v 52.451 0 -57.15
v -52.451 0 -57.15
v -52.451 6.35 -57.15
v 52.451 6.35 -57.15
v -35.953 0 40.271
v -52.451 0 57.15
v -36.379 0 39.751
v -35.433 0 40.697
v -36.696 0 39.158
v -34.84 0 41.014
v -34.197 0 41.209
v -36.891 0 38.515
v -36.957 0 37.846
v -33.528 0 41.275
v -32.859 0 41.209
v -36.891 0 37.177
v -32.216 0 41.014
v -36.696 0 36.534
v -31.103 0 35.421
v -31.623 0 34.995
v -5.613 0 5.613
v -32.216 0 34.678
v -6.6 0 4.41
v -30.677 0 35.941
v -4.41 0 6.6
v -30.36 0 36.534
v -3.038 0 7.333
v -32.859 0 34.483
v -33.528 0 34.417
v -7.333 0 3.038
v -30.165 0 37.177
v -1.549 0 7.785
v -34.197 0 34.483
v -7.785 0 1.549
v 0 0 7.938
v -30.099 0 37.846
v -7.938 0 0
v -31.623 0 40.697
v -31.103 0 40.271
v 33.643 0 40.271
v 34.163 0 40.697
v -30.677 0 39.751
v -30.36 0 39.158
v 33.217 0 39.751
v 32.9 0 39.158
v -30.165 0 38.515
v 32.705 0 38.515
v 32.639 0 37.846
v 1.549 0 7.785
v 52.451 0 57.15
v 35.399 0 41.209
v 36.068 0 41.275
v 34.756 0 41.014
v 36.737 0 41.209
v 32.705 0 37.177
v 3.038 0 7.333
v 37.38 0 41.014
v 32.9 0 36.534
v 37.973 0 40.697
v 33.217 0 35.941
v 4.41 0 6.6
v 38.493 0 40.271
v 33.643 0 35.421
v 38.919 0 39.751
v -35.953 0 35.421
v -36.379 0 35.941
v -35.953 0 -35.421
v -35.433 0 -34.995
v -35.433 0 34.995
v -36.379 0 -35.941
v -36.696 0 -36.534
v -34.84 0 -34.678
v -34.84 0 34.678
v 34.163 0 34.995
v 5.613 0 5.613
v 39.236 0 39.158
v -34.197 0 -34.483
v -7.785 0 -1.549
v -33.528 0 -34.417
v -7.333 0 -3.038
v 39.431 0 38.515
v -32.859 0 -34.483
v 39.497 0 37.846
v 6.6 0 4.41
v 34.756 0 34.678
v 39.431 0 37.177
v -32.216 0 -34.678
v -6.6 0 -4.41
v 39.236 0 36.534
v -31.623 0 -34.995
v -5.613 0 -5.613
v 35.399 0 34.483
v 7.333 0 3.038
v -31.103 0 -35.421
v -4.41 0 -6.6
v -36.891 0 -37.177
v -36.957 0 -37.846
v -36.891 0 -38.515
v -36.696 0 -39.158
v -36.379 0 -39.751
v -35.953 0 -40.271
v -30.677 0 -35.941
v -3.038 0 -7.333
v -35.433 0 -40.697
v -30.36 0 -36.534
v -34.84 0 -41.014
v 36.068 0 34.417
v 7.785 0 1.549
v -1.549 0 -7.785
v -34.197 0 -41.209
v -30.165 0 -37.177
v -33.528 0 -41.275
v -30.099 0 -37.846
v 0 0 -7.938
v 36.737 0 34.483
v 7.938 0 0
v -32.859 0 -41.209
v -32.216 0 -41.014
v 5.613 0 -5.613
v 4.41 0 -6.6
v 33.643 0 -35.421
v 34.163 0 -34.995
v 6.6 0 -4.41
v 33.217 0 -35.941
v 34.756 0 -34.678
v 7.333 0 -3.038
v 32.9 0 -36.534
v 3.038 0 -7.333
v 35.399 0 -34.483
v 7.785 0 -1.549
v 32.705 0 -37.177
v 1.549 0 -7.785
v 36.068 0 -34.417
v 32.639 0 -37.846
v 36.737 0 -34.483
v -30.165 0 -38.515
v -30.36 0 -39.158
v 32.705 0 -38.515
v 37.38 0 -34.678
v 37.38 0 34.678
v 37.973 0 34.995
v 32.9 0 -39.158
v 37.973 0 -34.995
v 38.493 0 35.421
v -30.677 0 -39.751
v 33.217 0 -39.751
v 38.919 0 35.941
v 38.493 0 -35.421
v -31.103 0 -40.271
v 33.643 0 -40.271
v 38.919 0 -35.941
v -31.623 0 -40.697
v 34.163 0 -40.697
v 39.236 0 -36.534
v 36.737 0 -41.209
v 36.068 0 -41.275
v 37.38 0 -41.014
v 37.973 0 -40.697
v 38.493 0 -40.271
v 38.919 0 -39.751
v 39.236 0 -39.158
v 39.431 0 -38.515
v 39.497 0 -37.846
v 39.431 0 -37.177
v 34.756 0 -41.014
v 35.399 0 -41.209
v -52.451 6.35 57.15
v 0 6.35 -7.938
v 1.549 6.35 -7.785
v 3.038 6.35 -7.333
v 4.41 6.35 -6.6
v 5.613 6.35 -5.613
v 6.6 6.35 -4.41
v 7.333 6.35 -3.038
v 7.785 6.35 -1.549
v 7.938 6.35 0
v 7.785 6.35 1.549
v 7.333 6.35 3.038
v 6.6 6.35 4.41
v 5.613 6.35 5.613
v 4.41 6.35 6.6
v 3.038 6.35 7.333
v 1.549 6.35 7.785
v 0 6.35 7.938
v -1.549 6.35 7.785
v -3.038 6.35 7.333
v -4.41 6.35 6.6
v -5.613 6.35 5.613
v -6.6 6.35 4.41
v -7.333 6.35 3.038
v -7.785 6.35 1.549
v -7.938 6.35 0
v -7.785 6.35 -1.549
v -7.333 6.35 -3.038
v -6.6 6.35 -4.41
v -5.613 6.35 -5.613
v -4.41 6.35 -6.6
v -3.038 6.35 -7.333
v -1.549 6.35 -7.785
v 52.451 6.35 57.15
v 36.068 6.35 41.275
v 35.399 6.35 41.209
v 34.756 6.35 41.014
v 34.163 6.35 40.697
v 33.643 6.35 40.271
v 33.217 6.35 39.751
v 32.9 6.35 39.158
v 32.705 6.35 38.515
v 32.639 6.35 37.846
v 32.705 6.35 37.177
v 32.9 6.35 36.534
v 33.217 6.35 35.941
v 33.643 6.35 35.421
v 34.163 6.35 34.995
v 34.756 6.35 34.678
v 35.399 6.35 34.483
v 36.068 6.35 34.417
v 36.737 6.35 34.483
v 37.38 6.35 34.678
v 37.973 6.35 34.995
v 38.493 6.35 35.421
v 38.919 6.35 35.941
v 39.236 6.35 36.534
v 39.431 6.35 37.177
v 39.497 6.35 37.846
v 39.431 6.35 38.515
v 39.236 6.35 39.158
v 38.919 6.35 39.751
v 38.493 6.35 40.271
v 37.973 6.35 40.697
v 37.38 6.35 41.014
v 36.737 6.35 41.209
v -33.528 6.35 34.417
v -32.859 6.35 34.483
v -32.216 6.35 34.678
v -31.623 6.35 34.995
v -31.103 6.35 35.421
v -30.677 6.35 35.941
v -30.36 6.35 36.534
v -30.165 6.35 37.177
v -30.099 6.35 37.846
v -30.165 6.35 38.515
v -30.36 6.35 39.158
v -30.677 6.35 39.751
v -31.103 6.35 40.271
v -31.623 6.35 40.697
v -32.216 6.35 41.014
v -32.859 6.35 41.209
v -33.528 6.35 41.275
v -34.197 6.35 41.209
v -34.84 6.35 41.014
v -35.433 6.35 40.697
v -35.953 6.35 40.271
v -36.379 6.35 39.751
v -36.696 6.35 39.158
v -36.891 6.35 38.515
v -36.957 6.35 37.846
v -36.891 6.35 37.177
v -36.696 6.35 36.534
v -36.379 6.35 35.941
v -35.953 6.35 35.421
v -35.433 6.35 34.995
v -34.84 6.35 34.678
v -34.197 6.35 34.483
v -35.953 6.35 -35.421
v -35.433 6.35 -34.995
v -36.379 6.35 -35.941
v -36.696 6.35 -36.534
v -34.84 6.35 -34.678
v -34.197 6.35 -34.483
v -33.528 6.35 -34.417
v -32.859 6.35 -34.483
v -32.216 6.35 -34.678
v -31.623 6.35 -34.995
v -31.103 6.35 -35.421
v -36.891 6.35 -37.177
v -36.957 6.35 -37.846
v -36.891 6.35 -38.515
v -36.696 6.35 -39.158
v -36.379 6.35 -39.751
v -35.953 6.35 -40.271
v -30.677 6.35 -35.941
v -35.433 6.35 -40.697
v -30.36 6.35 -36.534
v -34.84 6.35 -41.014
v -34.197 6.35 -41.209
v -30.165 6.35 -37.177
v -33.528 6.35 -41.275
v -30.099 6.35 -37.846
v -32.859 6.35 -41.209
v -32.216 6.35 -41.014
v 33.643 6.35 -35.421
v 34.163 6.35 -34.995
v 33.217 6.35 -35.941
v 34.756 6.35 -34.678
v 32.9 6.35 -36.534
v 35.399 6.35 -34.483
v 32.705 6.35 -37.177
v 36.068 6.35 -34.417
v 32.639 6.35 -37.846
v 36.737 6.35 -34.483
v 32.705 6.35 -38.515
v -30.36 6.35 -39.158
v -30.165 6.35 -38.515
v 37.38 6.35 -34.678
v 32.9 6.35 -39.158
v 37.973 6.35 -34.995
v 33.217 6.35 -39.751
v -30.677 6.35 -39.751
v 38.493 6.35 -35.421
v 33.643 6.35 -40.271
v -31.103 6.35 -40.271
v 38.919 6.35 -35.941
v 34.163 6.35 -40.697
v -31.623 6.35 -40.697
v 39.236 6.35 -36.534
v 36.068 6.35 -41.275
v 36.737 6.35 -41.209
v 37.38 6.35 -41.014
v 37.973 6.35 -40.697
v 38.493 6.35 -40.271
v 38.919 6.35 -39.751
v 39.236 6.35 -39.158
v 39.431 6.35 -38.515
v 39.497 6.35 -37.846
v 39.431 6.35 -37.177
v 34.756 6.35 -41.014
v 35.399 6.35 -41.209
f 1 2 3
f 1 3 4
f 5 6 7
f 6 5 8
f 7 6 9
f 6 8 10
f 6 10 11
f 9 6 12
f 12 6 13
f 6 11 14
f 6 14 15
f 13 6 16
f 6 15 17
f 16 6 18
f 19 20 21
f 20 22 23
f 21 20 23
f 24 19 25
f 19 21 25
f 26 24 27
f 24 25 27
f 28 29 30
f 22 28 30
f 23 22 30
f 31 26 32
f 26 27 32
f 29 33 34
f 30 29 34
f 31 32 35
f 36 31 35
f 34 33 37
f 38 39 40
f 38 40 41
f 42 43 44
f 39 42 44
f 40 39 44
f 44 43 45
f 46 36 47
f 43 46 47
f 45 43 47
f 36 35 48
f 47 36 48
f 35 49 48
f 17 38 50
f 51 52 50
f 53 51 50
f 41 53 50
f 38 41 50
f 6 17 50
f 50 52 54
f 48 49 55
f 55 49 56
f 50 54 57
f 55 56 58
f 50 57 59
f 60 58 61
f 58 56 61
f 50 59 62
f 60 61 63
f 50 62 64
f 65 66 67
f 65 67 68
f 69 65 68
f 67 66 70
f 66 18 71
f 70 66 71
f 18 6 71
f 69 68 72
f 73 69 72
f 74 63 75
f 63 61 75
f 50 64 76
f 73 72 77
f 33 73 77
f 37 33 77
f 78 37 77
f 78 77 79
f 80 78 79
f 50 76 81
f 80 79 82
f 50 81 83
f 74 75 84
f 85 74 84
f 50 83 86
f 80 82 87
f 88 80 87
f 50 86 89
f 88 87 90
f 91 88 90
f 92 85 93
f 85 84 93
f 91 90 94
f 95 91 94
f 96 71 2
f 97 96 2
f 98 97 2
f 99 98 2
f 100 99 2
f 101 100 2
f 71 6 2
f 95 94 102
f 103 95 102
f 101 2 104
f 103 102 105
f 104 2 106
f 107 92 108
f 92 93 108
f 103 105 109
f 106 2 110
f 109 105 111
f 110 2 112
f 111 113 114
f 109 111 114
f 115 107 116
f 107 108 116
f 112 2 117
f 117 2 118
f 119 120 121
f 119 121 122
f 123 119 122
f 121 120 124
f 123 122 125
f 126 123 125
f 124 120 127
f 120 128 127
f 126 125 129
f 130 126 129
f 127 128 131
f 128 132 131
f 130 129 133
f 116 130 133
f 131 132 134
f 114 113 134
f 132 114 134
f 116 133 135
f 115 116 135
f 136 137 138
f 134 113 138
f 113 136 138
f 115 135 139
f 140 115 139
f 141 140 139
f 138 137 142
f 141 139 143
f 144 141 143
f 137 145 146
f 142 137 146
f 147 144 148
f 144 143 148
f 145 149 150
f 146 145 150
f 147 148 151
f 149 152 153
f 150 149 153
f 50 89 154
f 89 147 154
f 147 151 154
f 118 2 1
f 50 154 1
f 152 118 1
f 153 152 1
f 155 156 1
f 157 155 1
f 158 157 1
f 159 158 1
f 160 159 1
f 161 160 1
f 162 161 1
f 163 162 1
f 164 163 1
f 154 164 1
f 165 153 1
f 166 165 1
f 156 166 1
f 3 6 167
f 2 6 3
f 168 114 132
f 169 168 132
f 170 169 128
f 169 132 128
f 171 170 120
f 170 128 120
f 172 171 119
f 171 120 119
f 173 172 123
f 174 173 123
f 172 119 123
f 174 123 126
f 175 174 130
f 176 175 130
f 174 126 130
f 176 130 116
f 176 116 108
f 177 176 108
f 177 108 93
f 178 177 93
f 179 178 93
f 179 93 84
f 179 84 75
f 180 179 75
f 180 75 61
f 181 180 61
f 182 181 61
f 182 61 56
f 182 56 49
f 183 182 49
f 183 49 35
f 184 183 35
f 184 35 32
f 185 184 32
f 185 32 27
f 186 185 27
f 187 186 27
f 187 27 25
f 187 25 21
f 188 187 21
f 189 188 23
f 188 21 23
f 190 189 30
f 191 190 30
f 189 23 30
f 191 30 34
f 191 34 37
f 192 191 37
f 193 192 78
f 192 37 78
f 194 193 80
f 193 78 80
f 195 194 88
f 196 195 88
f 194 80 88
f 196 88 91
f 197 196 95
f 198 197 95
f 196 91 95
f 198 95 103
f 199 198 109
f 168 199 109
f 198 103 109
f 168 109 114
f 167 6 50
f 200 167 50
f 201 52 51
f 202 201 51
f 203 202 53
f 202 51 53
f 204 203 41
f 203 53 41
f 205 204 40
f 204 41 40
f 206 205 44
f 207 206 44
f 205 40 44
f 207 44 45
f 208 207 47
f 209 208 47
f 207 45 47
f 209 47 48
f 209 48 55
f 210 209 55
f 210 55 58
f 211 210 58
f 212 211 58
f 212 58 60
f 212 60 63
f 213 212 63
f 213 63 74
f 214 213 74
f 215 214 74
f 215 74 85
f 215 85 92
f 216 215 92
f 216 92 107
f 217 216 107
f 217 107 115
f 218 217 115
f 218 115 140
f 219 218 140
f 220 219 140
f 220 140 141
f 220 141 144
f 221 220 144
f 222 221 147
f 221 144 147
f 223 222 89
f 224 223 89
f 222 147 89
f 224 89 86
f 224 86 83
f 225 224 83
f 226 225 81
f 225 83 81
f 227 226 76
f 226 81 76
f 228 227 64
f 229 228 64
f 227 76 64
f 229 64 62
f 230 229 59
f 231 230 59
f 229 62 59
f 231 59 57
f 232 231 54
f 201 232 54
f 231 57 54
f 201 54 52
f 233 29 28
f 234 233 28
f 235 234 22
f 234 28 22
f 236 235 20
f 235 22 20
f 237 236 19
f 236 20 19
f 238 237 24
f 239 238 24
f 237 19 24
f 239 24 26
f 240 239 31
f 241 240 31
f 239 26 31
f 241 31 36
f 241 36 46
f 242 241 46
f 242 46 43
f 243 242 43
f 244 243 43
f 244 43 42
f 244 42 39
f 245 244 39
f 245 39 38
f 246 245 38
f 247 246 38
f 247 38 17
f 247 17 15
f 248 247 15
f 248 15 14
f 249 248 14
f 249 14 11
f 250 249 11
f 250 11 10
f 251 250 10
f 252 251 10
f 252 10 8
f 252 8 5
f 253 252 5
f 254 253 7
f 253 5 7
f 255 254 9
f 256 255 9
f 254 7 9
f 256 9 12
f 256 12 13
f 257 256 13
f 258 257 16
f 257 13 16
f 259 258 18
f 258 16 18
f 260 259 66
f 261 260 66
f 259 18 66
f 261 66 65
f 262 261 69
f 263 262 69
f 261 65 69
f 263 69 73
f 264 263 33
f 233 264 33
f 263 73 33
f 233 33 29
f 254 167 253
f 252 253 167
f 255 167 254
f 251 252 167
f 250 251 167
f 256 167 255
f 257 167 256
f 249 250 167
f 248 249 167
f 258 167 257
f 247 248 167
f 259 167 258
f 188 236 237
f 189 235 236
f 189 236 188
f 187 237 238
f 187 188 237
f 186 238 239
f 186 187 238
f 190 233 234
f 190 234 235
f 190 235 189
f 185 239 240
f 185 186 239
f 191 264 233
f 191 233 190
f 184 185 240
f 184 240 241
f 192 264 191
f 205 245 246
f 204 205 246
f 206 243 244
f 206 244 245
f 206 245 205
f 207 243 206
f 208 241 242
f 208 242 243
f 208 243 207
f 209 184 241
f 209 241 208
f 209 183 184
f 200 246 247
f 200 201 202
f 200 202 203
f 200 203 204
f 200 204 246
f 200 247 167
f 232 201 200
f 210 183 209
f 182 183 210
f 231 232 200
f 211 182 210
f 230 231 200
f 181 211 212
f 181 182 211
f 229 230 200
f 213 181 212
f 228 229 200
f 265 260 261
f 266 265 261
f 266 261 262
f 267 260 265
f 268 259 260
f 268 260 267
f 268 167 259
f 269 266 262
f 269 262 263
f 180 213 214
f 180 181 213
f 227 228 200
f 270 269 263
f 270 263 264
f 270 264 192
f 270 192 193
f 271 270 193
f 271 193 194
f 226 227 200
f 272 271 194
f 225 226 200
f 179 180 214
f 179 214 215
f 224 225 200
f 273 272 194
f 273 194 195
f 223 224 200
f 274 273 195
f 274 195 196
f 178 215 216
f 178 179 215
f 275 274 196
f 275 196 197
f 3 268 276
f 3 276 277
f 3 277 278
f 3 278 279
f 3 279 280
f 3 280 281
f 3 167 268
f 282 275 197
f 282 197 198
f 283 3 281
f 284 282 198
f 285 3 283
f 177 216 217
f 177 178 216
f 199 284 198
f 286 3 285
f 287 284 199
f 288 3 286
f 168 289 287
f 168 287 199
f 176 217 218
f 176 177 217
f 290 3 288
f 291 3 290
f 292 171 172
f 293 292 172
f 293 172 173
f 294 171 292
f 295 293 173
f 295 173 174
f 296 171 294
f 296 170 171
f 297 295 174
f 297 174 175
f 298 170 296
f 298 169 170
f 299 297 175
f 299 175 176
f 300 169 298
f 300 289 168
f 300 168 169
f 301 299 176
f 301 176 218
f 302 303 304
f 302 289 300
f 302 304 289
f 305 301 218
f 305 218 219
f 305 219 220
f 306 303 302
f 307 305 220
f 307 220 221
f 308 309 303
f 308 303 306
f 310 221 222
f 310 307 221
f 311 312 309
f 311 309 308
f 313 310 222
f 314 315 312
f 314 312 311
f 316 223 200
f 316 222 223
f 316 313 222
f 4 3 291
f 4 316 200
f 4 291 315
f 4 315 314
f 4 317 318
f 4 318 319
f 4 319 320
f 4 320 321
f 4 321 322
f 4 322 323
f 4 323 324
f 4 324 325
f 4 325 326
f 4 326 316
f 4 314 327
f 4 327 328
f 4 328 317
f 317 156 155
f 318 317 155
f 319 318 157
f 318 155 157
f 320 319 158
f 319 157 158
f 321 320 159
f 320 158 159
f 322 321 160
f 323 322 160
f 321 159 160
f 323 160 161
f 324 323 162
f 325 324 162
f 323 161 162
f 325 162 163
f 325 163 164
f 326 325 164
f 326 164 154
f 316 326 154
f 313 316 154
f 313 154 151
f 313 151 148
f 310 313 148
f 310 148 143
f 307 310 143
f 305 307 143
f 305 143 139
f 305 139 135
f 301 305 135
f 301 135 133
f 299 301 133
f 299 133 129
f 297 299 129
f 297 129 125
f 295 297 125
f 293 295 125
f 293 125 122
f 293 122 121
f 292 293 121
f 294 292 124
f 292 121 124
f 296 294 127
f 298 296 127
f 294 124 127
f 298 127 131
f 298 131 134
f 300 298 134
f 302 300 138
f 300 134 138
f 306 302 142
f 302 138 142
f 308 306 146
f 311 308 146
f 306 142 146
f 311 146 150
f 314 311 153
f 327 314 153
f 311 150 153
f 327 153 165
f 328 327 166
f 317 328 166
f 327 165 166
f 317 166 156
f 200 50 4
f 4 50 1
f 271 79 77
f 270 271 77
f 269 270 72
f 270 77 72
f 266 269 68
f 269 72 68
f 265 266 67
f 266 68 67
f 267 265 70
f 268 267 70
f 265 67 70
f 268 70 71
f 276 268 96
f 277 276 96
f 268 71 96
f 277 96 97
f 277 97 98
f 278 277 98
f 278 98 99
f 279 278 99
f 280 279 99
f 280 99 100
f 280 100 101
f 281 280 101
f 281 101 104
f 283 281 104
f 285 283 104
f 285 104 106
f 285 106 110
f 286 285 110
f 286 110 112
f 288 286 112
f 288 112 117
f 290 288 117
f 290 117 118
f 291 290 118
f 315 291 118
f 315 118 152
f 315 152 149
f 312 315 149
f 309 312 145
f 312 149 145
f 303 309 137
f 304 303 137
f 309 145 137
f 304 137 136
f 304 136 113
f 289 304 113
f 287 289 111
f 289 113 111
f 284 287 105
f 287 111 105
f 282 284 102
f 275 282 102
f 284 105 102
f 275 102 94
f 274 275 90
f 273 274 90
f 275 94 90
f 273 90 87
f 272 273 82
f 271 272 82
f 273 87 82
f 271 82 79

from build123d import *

# Parameters (mm, degrees)
SKETCH1_W           = 104.902
SKETCH1_H           = 114.3
BOSS_EXTRUDE1_DEPTH = 6.35
CUT_EXTRUDE2_REACH  = 79.83
SKETCH3_R           = 3.429
CUT_EXTRUDE3_REACH  = 79.83
SKETCH4_R           = 7.9375


with BuildPart() as part:
    # Sketch1 → Boss-Extrude1 (new body)
    with BuildSketch(Plane(origin=(0, 0, 0), x_dir=(1, 0, 0), z_dir=(0, 1, 0))):
        Rectangle(SKETCH1_W, SKETCH1_H)
    extrude(amount=BOSS_EXTRUDE1_DEPTH)

    # Sketch3 → Cut-Extrude2 (cut, up to next)
    with BuildSketch(Plane.XZ, mode=Mode.PRIVATE) as cut_extrude2_sk1:
        with Locations(Location((-33.528, 37.846, 0), (0, 0, 270))):
            Circle(SKETCH3_R)
    cut_extrude2_tool1 = extrude(cut_extrude2_sk1.sketch, amount=-CUT_EXTRUDE2_REACH, mode=Mode.PRIVATE) & part.part
    # Sketch3 → Cut-Extrude2 (cut, up to next)
    with BuildSketch(Plane.XZ, mode=Mode.PRIVATE) as cut_extrude2_sk2:
        with Locations(Location((-33.528, -37.846, 0), (0, 0, 90))):
            Circle(SKETCH3_R)
    cut_extrude2_tool2 = extrude(cut_extrude2_sk2.sketch, amount=-CUT_EXTRUDE2_REACH, mode=Mode.PRIVATE) & part.part
    # Sketch3 → Cut-Extrude2 (cut, up to next)
    with BuildSketch(Plane.XZ, mode=Mode.PRIVATE) as cut_extrude2_sk3:
        with Locations(Location((36.068, 37.846, 0), (0, 0, 90))):
            Circle(SKETCH3_R)
    cut_extrude2_tool3 = extrude(cut_extrude2_sk3.sketch, amount=-CUT_EXTRUDE2_REACH, mode=Mode.PRIVATE) & part.part
    # Sketch3 → Cut-Extrude2 (cut, up to next)
    with BuildSketch(Plane.XZ, mode=Mode.PRIVATE) as cut_extrude2_sk4:
        with Locations(Location((36.068, -37.846, 0), (0, 0, 270))):
            Circle(SKETCH3_R)
    cut_extrude2_tool4 = extrude(cut_extrude2_sk4.sketch, amount=-CUT_EXTRUDE2_REACH, mode=Mode.PRIVATE) & part.part
    add(cut_extrude2_tool1.solids().sort_by_distance((-33.528, 0, 37.846))[0], mode=Mode.SUBTRACT)
    add(cut_extrude2_tool2.solids().sort_by_distance((-33.528, 0, -37.846))[0], mode=Mode.SUBTRACT)
    add(cut_extrude2_tool3.solids().sort_by_distance((36.068, 0, 37.846))[0], mode=Mode.SUBTRACT)
    add(cut_extrude2_tool4.solids().sort_by_distance((36.068, 0, -37.846))[0], mode=Mode.SUBTRACT)

    # Sketch4 → Cut-Extrude3 (cut, up to next)
    with BuildSketch(Plane.XZ, mode=Mode.PRIVATE) as cut_extrude3_sk1:
        with Locations(Location((0, 0, 0), (0, 0, 270))):
            Circle(SKETCH4_R)
    cut_extrude3_tool1 = extrude(cut_extrude3_sk1.sketch, amount=-CUT_EXTRUDE3_REACH, mode=Mode.PRIVATE) & part.part
    add(cut_extrude3_tool1.solids().sort_by_distance((0, 0, 0))[0], mode=Mode.SUBTRACT)


solid = part.part
